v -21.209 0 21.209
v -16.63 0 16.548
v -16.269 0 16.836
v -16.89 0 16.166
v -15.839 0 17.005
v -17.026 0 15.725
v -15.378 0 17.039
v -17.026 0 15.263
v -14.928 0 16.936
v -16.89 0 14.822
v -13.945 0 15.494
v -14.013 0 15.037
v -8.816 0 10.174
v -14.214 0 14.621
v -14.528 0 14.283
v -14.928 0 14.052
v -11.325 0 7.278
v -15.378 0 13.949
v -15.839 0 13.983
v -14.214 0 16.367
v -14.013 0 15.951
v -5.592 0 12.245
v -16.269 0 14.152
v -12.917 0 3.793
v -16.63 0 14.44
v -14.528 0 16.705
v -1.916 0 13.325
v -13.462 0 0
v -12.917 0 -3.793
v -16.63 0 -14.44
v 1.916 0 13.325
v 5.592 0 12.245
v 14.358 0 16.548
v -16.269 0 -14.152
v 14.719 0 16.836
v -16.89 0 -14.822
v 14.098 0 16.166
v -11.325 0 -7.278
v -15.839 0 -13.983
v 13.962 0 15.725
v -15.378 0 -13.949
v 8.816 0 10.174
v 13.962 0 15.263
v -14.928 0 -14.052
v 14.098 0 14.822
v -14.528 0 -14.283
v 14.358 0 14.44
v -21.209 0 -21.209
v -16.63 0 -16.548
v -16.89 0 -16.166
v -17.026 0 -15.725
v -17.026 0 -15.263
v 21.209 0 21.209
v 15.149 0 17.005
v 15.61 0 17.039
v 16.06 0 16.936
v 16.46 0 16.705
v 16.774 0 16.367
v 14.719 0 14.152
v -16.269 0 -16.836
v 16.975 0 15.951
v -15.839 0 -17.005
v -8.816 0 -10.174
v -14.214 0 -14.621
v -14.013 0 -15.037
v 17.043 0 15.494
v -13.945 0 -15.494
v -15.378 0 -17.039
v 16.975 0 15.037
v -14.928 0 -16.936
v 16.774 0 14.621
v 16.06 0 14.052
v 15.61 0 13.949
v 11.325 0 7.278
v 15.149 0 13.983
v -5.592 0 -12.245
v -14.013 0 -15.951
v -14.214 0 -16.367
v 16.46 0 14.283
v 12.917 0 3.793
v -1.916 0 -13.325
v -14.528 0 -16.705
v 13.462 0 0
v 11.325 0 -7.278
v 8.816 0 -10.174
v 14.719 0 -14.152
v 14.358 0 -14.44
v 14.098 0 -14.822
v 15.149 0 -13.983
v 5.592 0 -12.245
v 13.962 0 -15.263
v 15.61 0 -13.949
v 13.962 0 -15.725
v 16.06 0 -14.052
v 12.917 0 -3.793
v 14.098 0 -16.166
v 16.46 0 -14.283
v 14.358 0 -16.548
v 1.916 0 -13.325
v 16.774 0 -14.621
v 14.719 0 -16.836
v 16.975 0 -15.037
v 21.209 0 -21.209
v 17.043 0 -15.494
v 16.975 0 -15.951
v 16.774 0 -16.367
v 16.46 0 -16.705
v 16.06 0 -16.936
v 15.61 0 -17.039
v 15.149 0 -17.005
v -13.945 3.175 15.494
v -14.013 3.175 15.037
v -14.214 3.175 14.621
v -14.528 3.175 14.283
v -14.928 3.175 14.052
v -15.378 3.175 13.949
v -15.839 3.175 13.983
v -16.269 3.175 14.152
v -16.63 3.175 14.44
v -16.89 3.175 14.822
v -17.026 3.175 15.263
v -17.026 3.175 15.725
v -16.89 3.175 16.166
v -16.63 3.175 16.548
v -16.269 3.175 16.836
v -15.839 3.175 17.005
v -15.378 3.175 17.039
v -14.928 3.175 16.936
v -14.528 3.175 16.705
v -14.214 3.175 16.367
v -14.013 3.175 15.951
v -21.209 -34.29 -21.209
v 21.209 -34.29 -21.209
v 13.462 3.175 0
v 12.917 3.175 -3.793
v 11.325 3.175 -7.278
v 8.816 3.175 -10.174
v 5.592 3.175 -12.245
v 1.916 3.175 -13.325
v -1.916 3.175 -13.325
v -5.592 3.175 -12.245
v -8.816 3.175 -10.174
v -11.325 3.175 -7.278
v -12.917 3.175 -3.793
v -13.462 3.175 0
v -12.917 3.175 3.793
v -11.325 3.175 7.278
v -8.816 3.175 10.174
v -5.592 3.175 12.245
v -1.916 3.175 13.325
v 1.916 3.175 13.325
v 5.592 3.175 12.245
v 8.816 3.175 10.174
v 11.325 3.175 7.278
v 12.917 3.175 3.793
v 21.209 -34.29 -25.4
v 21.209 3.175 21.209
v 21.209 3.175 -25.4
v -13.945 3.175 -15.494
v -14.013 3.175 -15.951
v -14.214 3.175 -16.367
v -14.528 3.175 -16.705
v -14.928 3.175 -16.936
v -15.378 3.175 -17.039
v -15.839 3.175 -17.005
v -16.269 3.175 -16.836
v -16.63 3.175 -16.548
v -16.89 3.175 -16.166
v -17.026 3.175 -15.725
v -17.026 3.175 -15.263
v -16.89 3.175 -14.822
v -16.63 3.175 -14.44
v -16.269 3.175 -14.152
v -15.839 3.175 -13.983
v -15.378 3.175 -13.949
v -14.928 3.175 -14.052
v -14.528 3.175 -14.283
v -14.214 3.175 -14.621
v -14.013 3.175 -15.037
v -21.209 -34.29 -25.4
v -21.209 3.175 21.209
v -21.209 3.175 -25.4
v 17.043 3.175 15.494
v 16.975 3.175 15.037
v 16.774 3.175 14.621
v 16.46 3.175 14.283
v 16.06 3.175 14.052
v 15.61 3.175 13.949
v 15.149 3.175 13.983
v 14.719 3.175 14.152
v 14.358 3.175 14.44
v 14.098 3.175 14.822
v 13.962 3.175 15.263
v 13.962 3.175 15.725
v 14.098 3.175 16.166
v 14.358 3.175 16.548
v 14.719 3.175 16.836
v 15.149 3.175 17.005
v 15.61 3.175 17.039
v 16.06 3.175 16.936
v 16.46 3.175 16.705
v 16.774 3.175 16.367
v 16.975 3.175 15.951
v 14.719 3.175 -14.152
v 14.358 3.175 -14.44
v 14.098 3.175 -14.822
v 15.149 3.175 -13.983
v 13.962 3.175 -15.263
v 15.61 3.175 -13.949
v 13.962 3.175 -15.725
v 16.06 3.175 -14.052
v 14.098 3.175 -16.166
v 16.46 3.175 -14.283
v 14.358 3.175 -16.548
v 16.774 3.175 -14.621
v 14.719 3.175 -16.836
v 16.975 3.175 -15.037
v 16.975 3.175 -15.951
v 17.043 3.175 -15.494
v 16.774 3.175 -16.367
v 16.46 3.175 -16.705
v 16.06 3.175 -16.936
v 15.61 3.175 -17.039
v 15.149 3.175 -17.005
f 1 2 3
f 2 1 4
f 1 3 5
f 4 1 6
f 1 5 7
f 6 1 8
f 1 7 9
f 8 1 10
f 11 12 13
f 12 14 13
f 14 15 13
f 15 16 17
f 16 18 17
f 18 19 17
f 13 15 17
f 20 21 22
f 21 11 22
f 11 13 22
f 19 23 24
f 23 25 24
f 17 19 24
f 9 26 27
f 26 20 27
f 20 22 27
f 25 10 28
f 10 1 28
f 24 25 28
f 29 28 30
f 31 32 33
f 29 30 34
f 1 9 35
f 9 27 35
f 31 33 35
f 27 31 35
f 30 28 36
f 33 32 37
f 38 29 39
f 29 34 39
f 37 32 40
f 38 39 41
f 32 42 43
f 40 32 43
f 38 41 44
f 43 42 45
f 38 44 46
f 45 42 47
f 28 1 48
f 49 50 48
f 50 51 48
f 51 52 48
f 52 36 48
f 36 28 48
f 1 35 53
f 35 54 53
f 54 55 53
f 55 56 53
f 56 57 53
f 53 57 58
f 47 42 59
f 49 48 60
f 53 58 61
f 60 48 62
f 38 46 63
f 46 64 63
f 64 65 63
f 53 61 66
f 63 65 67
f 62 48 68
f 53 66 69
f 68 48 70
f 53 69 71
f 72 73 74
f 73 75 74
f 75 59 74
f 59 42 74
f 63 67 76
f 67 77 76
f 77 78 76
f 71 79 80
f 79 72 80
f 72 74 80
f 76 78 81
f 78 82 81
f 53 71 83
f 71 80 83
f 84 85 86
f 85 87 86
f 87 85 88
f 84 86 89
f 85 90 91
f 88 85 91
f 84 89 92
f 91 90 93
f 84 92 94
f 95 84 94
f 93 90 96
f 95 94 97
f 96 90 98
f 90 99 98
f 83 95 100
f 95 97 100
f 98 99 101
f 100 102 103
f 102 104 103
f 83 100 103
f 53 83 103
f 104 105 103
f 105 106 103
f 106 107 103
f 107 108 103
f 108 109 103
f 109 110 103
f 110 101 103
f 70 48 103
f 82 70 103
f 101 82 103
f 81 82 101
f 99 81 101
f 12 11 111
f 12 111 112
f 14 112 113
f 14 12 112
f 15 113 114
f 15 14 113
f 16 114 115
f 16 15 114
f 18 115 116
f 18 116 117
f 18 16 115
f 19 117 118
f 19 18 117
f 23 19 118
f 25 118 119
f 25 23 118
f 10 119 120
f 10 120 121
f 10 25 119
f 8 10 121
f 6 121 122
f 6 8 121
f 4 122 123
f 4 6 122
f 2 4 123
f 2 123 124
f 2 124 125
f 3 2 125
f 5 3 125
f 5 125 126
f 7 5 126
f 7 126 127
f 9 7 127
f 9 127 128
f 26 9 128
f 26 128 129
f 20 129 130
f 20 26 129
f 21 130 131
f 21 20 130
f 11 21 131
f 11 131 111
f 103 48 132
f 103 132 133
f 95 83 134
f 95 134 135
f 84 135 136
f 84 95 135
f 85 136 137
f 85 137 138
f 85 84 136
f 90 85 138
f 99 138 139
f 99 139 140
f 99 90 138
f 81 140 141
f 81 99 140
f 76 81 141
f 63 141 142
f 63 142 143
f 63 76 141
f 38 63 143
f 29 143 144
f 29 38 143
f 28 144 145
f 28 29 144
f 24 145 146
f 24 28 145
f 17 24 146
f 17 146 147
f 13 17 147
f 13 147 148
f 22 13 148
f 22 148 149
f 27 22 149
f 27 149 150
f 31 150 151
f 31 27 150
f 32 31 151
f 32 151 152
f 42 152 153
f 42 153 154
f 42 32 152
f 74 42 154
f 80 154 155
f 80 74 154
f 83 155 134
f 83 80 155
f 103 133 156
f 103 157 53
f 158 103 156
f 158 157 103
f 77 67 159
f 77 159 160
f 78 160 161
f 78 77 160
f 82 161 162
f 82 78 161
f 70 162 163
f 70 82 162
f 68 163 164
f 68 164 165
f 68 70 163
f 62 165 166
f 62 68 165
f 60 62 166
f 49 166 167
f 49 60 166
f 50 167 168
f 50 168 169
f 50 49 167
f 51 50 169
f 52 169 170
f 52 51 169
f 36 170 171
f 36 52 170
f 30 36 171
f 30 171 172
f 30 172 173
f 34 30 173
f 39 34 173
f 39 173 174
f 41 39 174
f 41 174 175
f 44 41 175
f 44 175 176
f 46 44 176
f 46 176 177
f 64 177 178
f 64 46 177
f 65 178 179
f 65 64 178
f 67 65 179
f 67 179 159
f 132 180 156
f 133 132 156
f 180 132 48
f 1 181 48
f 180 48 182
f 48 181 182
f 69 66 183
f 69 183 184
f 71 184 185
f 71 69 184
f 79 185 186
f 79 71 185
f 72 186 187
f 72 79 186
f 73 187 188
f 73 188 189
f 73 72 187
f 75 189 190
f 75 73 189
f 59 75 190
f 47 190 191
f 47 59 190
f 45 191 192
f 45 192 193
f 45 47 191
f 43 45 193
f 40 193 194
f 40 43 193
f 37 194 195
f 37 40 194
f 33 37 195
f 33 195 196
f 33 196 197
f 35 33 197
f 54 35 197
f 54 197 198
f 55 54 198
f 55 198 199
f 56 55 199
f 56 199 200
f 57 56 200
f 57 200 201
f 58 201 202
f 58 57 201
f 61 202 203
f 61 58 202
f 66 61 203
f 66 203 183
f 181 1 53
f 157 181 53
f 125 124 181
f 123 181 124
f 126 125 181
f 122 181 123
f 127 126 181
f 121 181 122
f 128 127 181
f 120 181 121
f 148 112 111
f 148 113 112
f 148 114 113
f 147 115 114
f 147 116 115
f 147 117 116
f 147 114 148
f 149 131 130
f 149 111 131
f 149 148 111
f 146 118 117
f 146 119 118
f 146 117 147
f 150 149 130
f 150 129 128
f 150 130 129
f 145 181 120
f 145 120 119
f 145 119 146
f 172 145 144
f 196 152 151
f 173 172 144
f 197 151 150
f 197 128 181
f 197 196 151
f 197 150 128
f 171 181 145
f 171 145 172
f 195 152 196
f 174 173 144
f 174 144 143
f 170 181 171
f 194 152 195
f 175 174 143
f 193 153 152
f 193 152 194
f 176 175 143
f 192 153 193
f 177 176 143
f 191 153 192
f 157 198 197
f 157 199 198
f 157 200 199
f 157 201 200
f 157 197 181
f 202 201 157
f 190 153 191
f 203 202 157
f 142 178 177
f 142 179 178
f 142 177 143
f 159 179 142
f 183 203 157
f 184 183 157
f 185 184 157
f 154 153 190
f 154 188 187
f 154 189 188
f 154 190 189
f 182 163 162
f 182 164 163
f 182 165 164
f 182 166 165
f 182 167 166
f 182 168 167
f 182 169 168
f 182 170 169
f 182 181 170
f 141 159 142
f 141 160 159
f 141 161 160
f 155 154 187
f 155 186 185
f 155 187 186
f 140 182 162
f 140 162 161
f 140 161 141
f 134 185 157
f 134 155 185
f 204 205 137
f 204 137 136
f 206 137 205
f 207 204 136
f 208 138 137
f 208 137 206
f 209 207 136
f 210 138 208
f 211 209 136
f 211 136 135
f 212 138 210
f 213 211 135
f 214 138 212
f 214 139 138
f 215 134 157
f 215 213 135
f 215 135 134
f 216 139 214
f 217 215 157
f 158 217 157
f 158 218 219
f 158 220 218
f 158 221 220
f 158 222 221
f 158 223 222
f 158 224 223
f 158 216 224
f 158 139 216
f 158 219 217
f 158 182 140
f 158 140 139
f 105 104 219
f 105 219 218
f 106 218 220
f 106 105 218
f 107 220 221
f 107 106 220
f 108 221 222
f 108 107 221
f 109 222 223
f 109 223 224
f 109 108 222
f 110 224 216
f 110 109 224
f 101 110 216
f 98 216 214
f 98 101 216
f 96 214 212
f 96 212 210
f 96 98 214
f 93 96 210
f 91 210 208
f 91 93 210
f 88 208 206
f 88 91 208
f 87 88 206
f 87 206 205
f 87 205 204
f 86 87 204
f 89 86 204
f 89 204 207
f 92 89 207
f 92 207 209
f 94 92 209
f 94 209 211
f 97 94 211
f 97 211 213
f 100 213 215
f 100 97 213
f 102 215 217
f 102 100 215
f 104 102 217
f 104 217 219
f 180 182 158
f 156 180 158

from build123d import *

# Parameters (mm, degrees)
SKETCH1_W           = 42.418
SKETCH1_H           = 42.418
SKETCH1_R           = 1.5494
SKETCH1_R_2         = 13.462
BOSS_EXTRUDE1_DEPTH = 3.175
SKETCH3_W           = 42.418
SKETCH3_H           = 4.191
BOSS_EXTRUDE2_DEPTH = 37.465


with BuildPart() as part:
    # Sketch1 → Boss-Extrude1 (new body)
    with BuildSketch(Plane(origin=(0, 0, 0), x_dir=(1, 0, 0), z_dir=(0, 1, 0))):
        Rectangle(SKETCH1_W, SKETCH1_H)
        with Locations((15.494, 15.494)):
            Circle(SKETCH1_R, mode=Mode.SUBTRACT)
        with Locations((-15.494, 15.494)):
            Circle(SKETCH1_R, mode=Mode.SUBTRACT)
        with Locations((15.494, -15.494)):
            Circle(SKETCH1_R, mode=Mode.SUBTRACT)
        with Locations((-15.494, -15.494)):
            Circle(SKETCH1_R, mode=Mode.SUBTRACT)
        Circle(SKETCH1_R_2, mode=Mode.SUBTRACT)
    extrude(amount=BOSS_EXTRUDE1_DEPTH)

    # Sketch3 → Boss-Extrude2 (add)
    with BuildSketch(Plane(origin=(0, 3.175, 0), x_dir=(1, 0, 0), z_dir=(0, 1, 0))):
        with Locations((0, 23.3045)):
            Rectangle(SKETCH3_W, SKETCH3_H)
    extrude(amount=-BOSS_EXTRUDE2_DEPTH)


solid = part.part
